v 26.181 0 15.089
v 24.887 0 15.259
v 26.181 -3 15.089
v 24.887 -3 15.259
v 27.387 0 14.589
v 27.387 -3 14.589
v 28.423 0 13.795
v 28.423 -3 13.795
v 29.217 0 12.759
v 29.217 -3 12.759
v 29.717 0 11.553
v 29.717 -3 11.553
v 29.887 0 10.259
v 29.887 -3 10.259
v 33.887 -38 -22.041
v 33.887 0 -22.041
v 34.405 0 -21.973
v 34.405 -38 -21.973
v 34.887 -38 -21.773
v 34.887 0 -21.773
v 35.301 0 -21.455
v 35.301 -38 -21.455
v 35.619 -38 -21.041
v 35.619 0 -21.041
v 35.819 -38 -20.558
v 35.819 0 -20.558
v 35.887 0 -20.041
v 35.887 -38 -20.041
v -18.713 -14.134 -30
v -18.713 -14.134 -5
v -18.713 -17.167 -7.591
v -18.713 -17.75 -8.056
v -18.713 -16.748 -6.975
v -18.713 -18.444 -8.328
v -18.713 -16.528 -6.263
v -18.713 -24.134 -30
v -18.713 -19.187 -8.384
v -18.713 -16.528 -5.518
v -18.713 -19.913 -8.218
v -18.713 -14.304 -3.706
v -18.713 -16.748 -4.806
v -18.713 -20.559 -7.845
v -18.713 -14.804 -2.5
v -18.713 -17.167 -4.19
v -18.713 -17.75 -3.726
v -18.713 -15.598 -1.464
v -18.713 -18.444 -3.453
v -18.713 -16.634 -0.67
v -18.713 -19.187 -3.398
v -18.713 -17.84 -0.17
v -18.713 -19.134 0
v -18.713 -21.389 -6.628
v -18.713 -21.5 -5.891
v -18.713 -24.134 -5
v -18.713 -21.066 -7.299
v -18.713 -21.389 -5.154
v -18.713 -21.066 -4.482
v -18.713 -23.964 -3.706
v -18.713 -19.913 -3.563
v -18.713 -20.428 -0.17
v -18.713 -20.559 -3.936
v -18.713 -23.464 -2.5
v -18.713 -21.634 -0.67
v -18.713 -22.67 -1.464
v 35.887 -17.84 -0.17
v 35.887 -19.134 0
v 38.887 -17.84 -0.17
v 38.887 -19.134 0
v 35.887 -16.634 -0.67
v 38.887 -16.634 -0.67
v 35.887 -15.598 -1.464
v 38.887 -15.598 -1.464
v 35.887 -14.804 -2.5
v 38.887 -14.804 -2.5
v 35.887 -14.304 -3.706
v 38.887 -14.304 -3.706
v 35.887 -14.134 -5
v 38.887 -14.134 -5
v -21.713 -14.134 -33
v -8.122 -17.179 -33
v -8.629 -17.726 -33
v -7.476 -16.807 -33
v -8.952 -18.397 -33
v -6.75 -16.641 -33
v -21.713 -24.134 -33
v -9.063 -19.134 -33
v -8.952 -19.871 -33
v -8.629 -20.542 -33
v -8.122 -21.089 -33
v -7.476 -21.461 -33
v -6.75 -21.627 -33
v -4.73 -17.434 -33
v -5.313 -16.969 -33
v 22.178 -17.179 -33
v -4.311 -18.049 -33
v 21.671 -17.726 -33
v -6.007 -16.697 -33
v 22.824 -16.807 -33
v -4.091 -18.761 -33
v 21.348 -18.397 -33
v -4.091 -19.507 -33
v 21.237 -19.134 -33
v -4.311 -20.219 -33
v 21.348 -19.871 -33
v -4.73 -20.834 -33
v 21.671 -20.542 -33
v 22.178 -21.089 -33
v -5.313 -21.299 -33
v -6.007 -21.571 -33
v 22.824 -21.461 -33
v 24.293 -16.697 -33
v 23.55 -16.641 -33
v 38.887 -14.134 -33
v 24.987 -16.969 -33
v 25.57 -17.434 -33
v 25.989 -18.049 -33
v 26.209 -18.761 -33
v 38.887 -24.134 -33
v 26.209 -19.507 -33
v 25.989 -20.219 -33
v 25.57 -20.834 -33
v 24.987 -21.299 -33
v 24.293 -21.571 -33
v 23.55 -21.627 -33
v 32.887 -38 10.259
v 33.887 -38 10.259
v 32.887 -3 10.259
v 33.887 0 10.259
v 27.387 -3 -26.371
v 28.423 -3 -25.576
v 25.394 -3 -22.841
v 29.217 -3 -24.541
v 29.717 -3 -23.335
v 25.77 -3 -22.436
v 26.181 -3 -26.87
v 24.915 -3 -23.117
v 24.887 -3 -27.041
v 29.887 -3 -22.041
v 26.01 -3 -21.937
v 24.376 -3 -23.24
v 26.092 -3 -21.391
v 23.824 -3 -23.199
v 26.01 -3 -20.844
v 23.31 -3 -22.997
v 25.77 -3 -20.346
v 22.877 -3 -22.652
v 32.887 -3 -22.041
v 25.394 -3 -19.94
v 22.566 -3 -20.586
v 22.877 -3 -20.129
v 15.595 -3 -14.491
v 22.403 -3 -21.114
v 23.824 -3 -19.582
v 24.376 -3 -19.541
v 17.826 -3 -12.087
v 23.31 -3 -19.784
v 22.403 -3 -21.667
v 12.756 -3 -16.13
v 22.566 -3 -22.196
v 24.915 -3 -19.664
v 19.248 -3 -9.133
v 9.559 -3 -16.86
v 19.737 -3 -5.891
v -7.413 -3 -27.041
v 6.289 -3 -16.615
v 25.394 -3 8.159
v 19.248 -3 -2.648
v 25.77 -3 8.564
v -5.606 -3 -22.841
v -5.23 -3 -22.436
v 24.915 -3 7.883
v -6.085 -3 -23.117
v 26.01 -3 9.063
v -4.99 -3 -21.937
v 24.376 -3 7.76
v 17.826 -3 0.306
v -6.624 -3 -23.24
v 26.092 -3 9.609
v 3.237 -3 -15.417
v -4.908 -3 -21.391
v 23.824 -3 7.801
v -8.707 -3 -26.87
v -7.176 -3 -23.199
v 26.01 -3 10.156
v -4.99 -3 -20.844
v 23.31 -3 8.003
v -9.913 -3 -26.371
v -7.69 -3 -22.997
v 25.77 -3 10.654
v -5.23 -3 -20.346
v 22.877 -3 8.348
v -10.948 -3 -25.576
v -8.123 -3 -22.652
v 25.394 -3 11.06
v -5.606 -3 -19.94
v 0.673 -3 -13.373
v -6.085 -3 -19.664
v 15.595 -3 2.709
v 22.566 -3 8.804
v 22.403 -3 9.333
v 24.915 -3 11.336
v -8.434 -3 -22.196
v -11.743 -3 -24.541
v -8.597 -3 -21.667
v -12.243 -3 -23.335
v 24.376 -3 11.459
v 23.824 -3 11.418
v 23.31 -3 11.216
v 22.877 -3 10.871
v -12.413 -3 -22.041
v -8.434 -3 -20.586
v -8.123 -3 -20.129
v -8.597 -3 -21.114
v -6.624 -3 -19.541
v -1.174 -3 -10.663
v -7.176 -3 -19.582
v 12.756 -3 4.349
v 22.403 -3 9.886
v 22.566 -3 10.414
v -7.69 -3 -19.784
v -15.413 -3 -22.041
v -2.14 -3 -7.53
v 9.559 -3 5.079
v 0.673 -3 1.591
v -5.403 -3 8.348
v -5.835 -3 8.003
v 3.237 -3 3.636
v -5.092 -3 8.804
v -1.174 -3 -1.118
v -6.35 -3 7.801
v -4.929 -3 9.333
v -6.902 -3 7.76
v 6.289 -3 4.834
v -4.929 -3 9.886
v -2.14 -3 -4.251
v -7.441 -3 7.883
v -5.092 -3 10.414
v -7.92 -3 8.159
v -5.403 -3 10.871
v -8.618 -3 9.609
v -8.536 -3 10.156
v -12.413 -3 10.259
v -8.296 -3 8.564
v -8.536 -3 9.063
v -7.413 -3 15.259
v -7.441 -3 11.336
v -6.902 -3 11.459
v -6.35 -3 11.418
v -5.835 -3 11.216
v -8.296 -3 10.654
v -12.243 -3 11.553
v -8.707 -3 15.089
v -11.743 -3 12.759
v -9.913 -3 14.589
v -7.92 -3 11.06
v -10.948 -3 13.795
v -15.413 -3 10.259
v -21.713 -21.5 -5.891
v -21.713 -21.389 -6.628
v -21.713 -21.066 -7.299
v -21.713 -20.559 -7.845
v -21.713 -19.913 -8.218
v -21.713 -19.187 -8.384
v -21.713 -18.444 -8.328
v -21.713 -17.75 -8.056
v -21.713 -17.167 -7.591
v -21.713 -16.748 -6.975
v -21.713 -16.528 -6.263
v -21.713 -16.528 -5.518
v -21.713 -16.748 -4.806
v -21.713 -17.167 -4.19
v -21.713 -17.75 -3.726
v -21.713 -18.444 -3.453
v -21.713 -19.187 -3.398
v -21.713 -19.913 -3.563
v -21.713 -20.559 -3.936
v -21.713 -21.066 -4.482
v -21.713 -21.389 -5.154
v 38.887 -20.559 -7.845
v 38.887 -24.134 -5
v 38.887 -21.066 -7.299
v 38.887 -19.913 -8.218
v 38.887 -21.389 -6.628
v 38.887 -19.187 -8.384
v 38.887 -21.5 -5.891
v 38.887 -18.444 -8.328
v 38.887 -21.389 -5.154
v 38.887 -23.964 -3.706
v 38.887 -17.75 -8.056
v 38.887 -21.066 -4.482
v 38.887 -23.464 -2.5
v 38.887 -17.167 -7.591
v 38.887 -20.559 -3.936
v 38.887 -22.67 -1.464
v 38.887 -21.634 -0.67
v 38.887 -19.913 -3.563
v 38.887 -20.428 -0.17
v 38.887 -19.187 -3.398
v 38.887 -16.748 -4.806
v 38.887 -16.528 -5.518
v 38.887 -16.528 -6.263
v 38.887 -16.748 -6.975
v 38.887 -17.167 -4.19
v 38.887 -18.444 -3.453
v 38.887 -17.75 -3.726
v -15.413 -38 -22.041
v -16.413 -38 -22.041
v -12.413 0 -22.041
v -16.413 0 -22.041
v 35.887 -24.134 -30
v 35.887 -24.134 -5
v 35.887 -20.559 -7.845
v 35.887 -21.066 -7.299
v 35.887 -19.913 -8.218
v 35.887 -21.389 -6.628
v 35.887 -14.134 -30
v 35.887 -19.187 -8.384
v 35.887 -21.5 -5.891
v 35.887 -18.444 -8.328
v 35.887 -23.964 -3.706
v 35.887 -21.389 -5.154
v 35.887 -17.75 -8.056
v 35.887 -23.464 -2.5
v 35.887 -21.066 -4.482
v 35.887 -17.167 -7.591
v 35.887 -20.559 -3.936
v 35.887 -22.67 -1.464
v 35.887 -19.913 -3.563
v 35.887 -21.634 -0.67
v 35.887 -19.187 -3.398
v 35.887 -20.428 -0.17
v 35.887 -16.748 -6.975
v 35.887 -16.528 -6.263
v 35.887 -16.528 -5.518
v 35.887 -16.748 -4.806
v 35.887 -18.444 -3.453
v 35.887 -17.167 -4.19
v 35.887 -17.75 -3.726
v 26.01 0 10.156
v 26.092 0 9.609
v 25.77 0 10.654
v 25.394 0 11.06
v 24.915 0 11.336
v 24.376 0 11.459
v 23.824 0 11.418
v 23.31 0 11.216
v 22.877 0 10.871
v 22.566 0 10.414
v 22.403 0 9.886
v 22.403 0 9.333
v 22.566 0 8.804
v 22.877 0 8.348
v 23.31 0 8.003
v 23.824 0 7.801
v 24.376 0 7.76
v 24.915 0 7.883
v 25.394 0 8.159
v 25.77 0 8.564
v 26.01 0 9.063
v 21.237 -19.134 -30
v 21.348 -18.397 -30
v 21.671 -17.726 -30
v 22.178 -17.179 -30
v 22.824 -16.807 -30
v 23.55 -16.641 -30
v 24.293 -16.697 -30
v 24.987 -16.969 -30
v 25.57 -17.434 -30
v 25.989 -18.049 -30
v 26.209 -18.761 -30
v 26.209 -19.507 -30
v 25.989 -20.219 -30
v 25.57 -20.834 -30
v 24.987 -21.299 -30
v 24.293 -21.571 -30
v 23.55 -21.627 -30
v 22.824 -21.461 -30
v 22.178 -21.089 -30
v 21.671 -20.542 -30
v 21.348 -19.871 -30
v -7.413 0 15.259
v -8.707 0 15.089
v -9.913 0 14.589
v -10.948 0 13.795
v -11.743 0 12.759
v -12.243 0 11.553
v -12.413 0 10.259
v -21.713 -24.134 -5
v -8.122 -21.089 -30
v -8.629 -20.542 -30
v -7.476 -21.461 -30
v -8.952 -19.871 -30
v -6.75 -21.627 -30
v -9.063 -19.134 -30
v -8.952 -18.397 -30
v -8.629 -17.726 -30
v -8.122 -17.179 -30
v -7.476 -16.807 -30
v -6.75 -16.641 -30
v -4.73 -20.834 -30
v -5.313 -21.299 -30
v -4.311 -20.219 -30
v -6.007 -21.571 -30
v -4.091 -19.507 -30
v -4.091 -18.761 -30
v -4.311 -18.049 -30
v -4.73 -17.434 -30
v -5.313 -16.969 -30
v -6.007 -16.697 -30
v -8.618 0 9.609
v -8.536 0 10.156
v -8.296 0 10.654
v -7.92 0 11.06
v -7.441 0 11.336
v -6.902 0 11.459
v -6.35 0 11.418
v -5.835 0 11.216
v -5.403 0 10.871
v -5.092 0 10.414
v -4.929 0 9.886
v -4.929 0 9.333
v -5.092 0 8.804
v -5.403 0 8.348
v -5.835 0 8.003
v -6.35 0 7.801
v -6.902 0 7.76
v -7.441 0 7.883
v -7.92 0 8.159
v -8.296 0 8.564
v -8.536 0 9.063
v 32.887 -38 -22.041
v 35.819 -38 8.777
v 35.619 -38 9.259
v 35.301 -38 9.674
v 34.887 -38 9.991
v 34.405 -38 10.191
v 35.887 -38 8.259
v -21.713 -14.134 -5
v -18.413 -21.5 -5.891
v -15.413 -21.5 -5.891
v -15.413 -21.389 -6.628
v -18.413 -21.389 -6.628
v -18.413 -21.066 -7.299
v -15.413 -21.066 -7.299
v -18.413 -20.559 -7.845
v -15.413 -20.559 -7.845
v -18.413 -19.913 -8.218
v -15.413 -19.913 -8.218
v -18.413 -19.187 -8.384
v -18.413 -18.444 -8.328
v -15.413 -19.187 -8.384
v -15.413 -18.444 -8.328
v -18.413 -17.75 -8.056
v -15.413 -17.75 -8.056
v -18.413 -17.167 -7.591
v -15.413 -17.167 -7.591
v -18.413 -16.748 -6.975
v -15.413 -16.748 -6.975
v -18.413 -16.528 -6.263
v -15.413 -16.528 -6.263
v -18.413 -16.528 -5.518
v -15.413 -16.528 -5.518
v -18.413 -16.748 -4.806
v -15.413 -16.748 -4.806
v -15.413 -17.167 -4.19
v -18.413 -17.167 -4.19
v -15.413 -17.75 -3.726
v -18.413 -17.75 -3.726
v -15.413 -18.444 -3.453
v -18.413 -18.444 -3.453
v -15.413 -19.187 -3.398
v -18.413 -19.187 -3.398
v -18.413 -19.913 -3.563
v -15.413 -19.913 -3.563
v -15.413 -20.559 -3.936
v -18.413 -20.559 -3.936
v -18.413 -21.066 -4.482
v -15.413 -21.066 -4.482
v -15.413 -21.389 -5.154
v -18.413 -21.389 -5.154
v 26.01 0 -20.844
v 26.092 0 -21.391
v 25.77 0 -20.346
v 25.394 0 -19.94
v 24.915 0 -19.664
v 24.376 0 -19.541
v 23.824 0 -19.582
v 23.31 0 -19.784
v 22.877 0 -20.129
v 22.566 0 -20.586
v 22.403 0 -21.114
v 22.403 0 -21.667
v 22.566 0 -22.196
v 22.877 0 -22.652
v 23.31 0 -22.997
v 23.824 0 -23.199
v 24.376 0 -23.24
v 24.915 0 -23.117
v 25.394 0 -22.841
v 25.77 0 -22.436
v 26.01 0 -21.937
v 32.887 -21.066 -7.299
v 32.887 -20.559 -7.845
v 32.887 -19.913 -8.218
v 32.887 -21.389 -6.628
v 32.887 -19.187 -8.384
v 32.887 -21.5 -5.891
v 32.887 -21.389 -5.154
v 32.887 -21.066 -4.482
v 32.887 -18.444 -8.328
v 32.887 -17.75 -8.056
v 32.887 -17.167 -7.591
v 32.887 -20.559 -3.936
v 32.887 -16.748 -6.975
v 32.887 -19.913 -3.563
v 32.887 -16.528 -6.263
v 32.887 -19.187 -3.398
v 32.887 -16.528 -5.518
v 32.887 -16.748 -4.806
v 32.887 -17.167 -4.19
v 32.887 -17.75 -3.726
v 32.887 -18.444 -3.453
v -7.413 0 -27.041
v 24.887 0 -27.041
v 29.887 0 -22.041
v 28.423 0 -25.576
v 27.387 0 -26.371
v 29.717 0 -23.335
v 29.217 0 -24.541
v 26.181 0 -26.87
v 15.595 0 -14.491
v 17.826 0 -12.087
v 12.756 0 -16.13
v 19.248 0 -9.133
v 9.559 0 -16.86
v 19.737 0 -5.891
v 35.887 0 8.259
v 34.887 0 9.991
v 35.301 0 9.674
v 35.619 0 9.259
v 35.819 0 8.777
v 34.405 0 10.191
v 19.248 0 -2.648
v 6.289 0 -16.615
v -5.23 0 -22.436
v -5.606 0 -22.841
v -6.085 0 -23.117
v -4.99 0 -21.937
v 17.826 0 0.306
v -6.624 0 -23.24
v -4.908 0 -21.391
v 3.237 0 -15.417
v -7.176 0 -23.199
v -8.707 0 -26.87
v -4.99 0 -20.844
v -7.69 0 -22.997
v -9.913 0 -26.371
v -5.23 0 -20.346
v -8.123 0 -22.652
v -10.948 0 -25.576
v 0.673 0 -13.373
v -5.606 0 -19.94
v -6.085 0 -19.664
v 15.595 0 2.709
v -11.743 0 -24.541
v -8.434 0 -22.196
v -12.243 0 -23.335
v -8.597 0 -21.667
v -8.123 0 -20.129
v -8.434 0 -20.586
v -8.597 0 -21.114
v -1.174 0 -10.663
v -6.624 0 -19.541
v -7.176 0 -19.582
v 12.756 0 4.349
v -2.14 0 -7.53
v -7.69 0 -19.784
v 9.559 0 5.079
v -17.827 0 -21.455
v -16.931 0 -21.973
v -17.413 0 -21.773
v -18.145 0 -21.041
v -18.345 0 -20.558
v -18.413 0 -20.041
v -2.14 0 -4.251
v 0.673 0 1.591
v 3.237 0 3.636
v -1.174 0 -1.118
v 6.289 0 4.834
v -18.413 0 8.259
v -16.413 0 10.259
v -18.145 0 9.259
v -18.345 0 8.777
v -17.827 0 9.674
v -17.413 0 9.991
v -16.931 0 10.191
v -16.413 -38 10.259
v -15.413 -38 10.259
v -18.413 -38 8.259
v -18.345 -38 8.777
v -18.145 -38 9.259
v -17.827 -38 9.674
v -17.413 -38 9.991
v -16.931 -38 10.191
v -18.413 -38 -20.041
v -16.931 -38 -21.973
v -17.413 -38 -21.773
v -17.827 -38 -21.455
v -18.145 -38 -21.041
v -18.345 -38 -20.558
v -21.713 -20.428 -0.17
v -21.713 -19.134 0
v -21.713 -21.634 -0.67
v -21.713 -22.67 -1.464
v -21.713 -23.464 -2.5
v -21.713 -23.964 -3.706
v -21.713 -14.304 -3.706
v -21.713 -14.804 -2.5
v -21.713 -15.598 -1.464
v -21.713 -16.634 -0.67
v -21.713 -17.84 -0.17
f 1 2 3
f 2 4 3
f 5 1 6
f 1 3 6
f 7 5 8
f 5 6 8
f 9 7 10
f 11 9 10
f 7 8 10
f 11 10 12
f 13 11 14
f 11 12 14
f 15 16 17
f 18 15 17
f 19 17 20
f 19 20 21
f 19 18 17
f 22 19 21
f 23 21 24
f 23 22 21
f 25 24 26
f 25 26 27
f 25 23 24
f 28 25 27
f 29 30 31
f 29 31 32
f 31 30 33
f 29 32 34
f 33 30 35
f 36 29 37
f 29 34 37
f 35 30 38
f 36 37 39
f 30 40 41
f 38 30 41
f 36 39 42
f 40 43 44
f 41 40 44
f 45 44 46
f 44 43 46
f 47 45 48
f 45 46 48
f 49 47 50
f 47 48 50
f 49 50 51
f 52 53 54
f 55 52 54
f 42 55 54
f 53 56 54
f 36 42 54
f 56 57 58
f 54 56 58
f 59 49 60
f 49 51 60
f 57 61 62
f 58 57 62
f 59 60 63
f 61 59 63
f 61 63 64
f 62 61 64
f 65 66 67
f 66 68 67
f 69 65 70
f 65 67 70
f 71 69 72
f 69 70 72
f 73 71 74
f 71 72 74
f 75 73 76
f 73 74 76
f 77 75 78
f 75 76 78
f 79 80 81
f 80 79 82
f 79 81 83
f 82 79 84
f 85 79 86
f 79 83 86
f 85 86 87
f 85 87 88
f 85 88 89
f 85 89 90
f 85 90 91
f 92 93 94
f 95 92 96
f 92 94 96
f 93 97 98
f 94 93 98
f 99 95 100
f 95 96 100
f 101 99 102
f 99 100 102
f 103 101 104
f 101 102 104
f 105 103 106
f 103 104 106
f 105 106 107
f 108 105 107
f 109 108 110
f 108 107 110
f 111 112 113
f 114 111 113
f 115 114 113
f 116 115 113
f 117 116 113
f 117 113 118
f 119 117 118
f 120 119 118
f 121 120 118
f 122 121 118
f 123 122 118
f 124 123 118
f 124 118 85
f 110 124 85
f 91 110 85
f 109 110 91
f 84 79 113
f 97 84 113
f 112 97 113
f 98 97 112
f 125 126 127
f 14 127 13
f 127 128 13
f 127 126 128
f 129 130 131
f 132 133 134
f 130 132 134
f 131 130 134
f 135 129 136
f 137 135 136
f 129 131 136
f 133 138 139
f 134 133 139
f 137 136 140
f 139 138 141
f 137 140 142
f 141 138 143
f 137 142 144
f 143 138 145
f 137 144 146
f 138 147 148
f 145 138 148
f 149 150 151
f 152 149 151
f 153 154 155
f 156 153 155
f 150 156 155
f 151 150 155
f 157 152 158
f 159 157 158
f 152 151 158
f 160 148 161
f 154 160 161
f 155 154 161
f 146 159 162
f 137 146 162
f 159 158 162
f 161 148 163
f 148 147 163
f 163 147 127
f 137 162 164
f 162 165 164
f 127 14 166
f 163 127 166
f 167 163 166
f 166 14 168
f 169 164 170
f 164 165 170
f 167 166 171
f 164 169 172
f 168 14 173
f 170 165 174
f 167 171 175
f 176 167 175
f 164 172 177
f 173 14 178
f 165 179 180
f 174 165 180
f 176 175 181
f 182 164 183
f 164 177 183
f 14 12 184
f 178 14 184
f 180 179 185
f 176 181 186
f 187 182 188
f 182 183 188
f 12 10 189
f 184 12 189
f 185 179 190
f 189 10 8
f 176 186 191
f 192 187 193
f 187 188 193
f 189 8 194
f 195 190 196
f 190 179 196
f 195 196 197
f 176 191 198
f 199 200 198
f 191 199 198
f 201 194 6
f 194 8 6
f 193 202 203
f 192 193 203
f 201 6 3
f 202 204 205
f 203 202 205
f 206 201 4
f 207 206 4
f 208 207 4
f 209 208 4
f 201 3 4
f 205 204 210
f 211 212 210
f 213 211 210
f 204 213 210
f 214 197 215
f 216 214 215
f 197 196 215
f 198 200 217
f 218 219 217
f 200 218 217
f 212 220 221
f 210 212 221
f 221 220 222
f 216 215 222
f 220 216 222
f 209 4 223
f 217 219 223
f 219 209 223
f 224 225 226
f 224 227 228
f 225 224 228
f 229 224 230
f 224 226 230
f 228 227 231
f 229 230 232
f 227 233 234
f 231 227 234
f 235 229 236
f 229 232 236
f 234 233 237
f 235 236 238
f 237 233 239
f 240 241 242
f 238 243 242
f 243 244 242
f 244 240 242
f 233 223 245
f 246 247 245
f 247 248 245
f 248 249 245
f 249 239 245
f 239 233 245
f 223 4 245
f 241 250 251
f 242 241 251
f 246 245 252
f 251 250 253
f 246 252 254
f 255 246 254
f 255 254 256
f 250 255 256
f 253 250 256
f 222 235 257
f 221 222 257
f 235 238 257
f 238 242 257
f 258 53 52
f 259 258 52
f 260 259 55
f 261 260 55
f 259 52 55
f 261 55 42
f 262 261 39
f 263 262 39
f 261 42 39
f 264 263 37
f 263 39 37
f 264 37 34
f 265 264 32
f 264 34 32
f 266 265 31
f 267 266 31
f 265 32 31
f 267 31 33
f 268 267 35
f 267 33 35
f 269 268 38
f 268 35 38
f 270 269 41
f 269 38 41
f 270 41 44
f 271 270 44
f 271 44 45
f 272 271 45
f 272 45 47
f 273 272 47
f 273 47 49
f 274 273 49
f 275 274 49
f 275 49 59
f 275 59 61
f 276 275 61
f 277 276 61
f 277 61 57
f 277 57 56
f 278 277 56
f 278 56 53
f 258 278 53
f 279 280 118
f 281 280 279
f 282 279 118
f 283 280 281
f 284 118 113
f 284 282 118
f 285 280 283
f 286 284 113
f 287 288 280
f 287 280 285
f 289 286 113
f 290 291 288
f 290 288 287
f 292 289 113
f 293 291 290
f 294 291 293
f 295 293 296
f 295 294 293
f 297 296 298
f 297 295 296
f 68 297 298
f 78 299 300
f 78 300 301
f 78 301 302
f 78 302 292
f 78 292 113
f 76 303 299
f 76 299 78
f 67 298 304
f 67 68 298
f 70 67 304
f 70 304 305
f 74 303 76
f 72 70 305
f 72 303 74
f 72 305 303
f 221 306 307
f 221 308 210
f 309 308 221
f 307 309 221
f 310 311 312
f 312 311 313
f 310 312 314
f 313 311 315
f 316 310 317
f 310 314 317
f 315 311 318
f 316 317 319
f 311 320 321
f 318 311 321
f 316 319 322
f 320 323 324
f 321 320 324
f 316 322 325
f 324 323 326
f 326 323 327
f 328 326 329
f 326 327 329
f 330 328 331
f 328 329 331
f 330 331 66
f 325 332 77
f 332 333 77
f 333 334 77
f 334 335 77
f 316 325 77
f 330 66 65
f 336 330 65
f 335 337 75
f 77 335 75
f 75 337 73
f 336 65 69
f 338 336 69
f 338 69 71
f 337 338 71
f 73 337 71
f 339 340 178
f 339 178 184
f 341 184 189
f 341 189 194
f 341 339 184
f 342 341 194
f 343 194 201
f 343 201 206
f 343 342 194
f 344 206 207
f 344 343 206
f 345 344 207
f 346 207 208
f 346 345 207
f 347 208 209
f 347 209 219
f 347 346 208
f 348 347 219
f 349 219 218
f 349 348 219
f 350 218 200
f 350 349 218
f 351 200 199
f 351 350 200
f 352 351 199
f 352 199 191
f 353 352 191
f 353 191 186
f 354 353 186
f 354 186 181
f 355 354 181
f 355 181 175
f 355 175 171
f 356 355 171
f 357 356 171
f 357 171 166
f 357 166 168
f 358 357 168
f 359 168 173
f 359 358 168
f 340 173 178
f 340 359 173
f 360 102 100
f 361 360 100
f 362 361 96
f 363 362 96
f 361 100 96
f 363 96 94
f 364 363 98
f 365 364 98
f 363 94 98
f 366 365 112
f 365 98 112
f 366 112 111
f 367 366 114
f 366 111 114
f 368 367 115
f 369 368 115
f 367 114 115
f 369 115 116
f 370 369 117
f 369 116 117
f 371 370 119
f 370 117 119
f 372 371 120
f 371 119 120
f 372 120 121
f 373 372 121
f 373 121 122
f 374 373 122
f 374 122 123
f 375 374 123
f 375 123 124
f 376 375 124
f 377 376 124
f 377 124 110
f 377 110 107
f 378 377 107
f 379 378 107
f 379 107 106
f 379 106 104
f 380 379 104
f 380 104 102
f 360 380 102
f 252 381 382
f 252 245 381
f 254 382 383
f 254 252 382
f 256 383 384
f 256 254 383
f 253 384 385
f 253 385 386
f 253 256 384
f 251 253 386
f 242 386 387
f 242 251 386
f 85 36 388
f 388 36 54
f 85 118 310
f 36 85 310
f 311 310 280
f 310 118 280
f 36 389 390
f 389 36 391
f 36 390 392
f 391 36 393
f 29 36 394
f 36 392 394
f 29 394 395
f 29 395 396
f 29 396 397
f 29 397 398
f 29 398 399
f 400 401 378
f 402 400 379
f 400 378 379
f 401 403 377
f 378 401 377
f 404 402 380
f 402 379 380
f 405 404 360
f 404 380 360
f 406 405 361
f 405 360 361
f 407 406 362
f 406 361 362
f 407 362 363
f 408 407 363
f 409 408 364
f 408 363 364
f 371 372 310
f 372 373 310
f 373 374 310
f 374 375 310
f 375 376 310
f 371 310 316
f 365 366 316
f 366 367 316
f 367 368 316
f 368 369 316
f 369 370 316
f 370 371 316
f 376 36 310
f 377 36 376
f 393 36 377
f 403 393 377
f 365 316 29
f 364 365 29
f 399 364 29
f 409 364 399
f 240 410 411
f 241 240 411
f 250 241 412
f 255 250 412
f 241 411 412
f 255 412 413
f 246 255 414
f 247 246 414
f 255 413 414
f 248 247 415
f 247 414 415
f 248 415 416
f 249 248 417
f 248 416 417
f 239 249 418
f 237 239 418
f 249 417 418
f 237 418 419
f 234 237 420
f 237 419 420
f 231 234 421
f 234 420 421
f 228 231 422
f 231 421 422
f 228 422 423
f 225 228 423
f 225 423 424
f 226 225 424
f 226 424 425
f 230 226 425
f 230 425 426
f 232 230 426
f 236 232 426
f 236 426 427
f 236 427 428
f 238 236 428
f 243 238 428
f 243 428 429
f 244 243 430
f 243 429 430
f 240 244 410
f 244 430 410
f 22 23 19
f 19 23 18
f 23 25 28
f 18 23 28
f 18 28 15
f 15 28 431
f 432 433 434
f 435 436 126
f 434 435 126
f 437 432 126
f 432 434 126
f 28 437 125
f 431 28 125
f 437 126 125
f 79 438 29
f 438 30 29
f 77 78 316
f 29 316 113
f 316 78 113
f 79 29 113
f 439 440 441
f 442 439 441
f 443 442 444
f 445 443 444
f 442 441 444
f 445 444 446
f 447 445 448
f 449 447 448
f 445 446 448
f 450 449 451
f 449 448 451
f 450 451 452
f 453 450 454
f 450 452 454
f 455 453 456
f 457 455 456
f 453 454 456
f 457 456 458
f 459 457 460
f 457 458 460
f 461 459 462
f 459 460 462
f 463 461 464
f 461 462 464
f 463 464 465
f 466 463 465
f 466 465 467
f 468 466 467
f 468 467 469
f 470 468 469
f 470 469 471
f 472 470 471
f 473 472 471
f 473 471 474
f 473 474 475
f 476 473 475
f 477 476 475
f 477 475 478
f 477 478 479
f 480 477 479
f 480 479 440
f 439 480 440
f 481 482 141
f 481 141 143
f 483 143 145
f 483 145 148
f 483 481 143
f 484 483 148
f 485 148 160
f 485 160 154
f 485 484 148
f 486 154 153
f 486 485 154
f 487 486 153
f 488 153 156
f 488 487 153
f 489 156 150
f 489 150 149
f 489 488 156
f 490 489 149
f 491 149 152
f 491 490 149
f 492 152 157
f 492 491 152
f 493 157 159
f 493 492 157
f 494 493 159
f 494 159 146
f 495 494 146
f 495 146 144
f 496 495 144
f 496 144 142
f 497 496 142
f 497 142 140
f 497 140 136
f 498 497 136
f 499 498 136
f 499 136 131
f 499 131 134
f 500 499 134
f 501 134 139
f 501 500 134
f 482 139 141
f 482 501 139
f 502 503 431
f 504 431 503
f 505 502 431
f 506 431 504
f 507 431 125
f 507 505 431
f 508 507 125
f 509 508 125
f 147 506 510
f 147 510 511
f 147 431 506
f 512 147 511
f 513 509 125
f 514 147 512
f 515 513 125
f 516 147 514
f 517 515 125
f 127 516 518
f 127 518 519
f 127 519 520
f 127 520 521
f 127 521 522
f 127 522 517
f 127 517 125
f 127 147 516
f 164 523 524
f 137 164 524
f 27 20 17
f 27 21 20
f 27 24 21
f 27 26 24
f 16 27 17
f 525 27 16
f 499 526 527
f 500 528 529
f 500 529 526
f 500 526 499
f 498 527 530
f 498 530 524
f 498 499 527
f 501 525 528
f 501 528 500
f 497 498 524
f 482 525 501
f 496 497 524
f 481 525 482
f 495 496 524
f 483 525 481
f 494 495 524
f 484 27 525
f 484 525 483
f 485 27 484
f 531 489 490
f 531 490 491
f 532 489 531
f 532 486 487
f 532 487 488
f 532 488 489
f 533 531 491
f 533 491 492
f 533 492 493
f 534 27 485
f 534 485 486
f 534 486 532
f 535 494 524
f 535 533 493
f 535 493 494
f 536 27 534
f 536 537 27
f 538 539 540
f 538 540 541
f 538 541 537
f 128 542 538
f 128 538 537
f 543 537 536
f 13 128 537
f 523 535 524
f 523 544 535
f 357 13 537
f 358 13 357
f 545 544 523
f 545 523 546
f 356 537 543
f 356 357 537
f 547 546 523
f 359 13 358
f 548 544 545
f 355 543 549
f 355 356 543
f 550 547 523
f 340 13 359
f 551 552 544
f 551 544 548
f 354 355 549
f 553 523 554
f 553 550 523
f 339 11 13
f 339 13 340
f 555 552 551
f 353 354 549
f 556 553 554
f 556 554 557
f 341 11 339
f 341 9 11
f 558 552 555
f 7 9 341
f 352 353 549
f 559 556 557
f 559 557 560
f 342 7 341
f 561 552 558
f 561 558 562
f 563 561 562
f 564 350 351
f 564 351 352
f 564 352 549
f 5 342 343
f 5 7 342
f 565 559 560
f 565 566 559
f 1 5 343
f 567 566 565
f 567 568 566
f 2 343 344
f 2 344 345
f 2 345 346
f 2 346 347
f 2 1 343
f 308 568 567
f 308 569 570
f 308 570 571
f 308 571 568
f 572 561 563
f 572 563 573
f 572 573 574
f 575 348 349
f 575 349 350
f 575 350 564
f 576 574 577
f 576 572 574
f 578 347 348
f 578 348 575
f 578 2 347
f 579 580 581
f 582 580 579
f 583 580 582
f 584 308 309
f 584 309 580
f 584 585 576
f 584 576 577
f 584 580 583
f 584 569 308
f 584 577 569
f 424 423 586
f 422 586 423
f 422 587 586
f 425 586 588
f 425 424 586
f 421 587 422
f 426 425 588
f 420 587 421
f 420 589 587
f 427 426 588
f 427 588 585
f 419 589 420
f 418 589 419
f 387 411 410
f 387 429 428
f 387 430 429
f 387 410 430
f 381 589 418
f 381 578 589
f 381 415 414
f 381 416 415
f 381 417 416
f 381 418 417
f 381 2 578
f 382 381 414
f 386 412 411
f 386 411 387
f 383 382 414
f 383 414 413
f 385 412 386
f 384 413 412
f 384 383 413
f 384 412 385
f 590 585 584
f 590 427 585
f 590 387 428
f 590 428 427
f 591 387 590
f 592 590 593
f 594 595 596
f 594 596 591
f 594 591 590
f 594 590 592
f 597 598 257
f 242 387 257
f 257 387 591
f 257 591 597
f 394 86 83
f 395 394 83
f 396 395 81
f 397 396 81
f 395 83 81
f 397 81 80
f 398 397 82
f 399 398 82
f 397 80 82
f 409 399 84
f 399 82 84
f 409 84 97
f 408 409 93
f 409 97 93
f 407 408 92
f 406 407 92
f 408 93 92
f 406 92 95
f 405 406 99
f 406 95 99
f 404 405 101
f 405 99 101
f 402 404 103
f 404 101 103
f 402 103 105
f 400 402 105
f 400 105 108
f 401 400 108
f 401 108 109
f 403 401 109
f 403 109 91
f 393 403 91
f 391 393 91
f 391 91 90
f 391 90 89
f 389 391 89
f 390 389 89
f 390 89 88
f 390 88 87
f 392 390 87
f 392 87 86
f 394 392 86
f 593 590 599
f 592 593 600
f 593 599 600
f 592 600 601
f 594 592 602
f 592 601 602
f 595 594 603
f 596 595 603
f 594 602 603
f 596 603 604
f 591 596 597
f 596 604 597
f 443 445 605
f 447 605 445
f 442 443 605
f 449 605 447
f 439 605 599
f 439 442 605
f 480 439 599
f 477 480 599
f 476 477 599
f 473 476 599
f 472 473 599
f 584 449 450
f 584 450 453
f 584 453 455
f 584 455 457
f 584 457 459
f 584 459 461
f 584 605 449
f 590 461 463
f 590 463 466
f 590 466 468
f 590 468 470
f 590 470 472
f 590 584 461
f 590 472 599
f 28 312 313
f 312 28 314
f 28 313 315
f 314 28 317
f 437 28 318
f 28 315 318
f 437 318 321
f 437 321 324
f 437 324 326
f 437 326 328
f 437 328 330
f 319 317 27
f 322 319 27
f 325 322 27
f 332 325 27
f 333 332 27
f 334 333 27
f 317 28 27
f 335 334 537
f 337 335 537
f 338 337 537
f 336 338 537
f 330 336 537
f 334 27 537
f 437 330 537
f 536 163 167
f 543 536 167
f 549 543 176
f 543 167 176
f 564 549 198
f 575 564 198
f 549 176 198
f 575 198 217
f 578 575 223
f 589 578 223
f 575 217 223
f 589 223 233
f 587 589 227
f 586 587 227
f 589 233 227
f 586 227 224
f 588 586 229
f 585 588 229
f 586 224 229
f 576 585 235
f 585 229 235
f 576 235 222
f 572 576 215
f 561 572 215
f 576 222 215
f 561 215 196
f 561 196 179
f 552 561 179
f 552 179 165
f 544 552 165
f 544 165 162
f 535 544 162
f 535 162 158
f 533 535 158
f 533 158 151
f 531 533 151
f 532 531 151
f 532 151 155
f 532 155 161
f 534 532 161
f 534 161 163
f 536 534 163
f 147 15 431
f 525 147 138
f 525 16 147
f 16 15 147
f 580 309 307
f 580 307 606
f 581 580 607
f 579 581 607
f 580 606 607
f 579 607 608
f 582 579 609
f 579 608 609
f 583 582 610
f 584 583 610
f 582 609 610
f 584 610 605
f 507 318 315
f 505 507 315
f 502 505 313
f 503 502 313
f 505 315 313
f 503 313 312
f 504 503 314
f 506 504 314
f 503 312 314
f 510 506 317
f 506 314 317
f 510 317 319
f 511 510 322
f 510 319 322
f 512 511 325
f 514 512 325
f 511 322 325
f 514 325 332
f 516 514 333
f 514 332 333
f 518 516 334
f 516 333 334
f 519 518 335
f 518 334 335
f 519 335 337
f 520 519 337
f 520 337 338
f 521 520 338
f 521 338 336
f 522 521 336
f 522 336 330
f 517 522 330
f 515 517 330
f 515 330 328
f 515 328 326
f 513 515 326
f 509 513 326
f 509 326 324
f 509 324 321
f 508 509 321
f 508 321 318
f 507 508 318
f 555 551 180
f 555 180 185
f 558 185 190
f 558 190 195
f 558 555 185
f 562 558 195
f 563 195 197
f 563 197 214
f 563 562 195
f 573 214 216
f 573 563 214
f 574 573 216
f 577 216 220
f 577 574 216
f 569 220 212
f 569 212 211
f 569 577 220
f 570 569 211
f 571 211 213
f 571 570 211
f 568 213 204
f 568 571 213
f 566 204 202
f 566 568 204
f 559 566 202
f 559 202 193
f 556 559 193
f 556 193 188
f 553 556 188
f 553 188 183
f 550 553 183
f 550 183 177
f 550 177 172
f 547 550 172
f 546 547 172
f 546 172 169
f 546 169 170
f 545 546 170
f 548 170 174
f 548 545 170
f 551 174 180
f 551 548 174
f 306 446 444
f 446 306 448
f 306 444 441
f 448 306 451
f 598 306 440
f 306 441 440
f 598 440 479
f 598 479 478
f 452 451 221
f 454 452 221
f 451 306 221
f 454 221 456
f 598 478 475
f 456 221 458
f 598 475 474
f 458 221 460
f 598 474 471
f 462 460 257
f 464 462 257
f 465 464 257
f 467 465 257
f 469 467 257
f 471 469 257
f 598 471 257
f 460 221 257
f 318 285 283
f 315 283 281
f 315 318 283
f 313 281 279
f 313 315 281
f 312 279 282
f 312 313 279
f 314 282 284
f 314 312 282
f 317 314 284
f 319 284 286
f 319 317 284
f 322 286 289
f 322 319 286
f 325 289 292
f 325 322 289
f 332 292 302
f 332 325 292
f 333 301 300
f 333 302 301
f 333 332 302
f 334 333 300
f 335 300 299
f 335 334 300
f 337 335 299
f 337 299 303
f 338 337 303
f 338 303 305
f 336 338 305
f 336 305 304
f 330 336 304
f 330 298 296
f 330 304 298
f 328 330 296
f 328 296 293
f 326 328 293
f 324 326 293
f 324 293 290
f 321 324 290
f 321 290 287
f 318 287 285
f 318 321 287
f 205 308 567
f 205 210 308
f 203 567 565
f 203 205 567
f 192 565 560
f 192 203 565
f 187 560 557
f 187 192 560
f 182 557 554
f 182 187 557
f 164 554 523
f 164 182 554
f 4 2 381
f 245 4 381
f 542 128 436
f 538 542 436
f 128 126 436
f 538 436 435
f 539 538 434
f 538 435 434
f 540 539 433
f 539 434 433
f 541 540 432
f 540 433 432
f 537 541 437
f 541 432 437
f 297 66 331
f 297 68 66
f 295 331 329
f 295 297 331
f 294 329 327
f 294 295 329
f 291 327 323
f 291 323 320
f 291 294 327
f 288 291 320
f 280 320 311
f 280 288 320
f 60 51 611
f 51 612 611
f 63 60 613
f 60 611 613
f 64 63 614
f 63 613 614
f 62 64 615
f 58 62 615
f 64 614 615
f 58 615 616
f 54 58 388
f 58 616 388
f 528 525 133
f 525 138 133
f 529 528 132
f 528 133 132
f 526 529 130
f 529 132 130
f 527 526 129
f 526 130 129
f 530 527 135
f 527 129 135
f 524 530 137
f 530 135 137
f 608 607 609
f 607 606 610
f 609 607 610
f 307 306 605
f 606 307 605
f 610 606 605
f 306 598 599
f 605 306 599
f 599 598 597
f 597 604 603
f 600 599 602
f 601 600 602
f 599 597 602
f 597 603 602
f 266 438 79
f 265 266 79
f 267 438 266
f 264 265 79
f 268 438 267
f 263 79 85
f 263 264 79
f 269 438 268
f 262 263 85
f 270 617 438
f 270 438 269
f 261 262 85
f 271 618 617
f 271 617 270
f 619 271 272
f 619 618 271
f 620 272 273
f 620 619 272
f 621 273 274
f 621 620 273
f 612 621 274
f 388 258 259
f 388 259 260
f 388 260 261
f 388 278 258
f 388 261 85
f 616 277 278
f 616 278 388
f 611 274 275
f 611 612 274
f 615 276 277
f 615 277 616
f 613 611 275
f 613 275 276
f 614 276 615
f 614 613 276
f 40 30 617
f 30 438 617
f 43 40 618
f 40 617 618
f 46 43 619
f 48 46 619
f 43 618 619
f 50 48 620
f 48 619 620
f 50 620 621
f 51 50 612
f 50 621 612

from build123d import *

# Parameters (mm, degrees)
F0_R           = 1.855
F1_DEPTH       = 3
F2_R           = 5
F3_W           = 3
F3_H           = 32.3
F4_DEPTH       = 3
F5_DEPTH       = 38
F6_R           = 2
F8_R           = 11
F9_DEPTH       = 3.001
F10_W          = 10
F10_H          = 3
F11_DEPTH      = 3
F12_R          = 4.99999
F13_DEPTH      = 54.6
F14_W          = 10
F14_H          = 30
F14_H_2        = 3
F15_DEPTH      = 3
F16_DEPTH      = 57.601
F16_DEPTH_BACK = 3.001
F17_R          = 4.99999
F19_DEPTH      = 25


# Not quite as in the source:
# - a fillet or chamfer is up to 0.001 mm smaller than in the source, because OpenCascade refuses the exact size


with BuildPart() as f1:
    # F0 (on Front) → F1 (new body)
    with BuildSketch(Plane.XZ):
        Polygon((29.887046665, 15.2593358934), (-12.412953335, 15.2593358934), (-12.412953335, 9.6093358934), (-12.412953335, -27.0406641066), (29.887046665, -27.0406641066), align=None)
        with Locations((-6.762953335, -21.3906641066)):
            Circle(F0_R, mode=Mode.SUBTRACT)
        with Locations((24.237046665, -21.3906641066)):
            Circle(F0_R, mode=Mode.SUBTRACT)
        with BuildLine():
            ThreePointArc((-4.907953335, 9.6093358934), (-6.762953335, 7.7543358934), (-8.617953335, 9.6093358934))
            ThreePointArc((-8.617953335, 9.6093358934), (-6.762953335, 11.4643358934), (-4.907953335, 9.6093358934))
        make_face(mode=Mode.SUBTRACT)
        with Locations((24.237046665, 9.6093358934)):
            Circle(F0_R, mode=Mode.SUBTRACT)
    extrude(amount=F1_DEPTH)

    # F2
    f2_edges = [f1.edges().sort_by_distance(p)[0] for p in [
        (29.887047, -1.5, 15.259336),
        (29.887047, -1.5, -27.040664),
        (-12.412953, -1.5, 15.259336),
        (-12.412953, -1.5, -27.040664),
    ]]
    fillet(f2_edges, radius=F2_R)

    # F3 (on face) → F4 (join)
    with BuildSketch(Plane(origin=(0, 0, 0), x_dir=(-1, 0, 0), z_dir=(0, 1, 0))):
        with Locations((13.912953335, -5.8906641066)):
            Rectangle(F3_W, F3_H)
        with Locations((-31.387046665, -5.8906641066)):
            Rectangle(F3_W, F3_H)
    extrude(amount=-F4_DEPTH)

    # F3 (on face) → F5 (join)
    with BuildSketch(Plane(origin=(0, 0, 0), x_dir=(-1, 0, 0), z_dir=(0, 1, 0))):
        with Locations((16.912953335, -5.8906641066)):
            Rectangle(F3_W, F3_H)
        with Locations((-34.387046665, -5.8906641066)):
            Rectangle(F3_W, F3_H)
    extrude(amount=-F5_DEPTH)

    # F6
    f6_edges = [f1.edges().sort_by_distance(p)[0] for p in [
        (35.887047, -19, -22.040664),
        (-18.412953, -19, -22.040664),
        (-18.412953, -19, 10.259336),
        (35.887047, -19, 10.259336),
    ]]
    fillet(f6_edges, radius=F6_R)

    # F8 (on face) → F9 (cut, through all)
    with BuildSketch(Plane.XZ.offset(3)):
        with Locations((8.737046665, -5.8906641066)):
            Circle(F8_R)
    extrude(amount=-F9_DEPTH, mode=Mode.SUBTRACT)


with BuildPart() as f11:
    # F10 (on face) → F11 (new body)
    with BuildSketch(Plane.YZ.offset(35.887046665)):
        Polygon((-14.1340063512, 0), (-19, 0), (-24.1340063512, 0), (-24.1340063512, -30), (-14.1340063512, -30), align=None)
        with Locations((-19.1340063512, -31.5)):
            Rectangle(F10_W, F10_H)
    extrude(amount=F11_DEPTH)

    # F12 (radius 5 in the source; OpenCascade refuses exactly that, so slightly less here)
    f12_edges = [f11.edges().sort_by_distance(p)[0] for p in [
        (37.387047, -24.134006, 0),
        (37.387047, -14.134006, 0),
    ]]
    fillet(f12_edges, radius=F12_R)

    # F10 (on face) → F13 (join)
    with BuildSketch(Plane.YZ.offset(35.887046665)):
        with Locations((-19.1340063512, -31.5)):
            Rectangle(F10_W, F10_H)
    extrude(amount=-F13_DEPTH)

    # F14 (on face) → F15 (join)
    with BuildSketch(Plane(origin=(-18.712953335, 0, 0), x_dir=(0, -1, 0), z_dir=(-1, 0, 0))):
        with Locations((19.1340063512, -15)):
            Rectangle(F14_W, F14_H)
        with Locations((19.1340063512, -31.5)):
            Rectangle(F14_W, F14_H_2)
    extrude(amount=F15_DEPTH)


with BuildPart() as f16_tool:
    # F7 (on face) → F16 (new body, two sides)
    with BuildSketch(Plane.YZ.offset(35.887046665)) as f16_sk:
        with BuildLine():
            Line((-21.5, -5.8906641066), (-19, -5.8906641066))
            Line((-19, -5.8906641066), (-16.5, -5.8906641066))
            ThreePointArc((-16.5, -5.8906641066), (-19, -3.3906641066), (-21.5, -5.8906641066))
        make_face()
        with BuildLine():
            Line((-16.5, -5.8906641066), (-19, -5.8906641066))
            Line((-19, -5.8906641066), (-21.5, -5.8906641066))
            ThreePointArc((-21.5, -5.8906641066), (-19, -8.3906641066), (-16.5, -5.8906641066))
        make_face()
    extrude(amount=-F16_DEPTH)
    extrude(f16_sk.sketch, amount=F16_DEPTH_BACK)


with BuildPart() as f1_1:
    add(f1.part)

    # F16: cut by f16_tool
    add(f16_tool.part, mode=Mode.SUBTRACT)


with BuildPart() as f11_1:
    add(f11.part)

    # F16: cut by f16_tool
    add(f16_tool.part, mode=Mode.SUBTRACT)

    # F17 (radius 5 in the source; OpenCascade refuses exactly that, so slightly less here)
    f17_edges = [f11_1.edges().sort_by_distance(p)[0] for p in [
        (-20.212953, -14.134006, 0),
        (-20.212953, -24.134006, 0),
    ]]
    fillet(f17_edges, radius=F17_R)

    # F18 (on face) → F19 (cut)
    with BuildSketch(Plane(origin=(0, 0, -33), x_dir=(1, 0, 0), z_dir=(0, 0, -1))):
        with BuildLine():
            Line((-9.062953335, 19.1340063512), (-6.562953335, 19.1340063512))
            Line((-6.562953335, 19.1340063512), (-4.062953335, 19.1340063512))
            ThreePointArc((-4.062953335, 19.1340063512), (-6.562953335, 21.6340063512), (-9.062953335, 19.1340063512))
        make_face()
        with BuildLine():
            Line((-4.062953335, 19.1340063512), (-6.562953335, 19.1340063512))
            Line((-6.562953335, 19.1340063512), (-9.062953335, 19.1340063512))
            ThreePointArc((-9.062953335, 19.1340063512), (-6.562953335, 16.6340063512), (-4.062953335, 19.1340063512))
        make_face()
        with BuildLine():
            ThreePointArc((26.237046665, 19.1340063512), (23.737046665, 21.6340063512), (21.237046665, 19.1340063512))
            Line((21.237046665, 19.1340063512), (23.737046665, 19.1340063512))
            Line((23.737046665, 19.1340063512), (26.237046665, 19.1340063512))
        make_face()
        with BuildLine():
            Line((23.737046665, 19.1340063512), (21.237046665, 19.1340063512))
            ThreePointArc((21.237046665, 19.1340063512), (23.737046665, 16.6340063512), (26.237046665, 19.1340063512))
            Line((26.237046665, 19.1340063512), (23.737046665, 19.1340063512))
        make_face()
    extrude(amount=-F19_DEPTH, mode=Mode.SUBTRACT)


solid = Compound([f1_1.part, f11_1.part])
